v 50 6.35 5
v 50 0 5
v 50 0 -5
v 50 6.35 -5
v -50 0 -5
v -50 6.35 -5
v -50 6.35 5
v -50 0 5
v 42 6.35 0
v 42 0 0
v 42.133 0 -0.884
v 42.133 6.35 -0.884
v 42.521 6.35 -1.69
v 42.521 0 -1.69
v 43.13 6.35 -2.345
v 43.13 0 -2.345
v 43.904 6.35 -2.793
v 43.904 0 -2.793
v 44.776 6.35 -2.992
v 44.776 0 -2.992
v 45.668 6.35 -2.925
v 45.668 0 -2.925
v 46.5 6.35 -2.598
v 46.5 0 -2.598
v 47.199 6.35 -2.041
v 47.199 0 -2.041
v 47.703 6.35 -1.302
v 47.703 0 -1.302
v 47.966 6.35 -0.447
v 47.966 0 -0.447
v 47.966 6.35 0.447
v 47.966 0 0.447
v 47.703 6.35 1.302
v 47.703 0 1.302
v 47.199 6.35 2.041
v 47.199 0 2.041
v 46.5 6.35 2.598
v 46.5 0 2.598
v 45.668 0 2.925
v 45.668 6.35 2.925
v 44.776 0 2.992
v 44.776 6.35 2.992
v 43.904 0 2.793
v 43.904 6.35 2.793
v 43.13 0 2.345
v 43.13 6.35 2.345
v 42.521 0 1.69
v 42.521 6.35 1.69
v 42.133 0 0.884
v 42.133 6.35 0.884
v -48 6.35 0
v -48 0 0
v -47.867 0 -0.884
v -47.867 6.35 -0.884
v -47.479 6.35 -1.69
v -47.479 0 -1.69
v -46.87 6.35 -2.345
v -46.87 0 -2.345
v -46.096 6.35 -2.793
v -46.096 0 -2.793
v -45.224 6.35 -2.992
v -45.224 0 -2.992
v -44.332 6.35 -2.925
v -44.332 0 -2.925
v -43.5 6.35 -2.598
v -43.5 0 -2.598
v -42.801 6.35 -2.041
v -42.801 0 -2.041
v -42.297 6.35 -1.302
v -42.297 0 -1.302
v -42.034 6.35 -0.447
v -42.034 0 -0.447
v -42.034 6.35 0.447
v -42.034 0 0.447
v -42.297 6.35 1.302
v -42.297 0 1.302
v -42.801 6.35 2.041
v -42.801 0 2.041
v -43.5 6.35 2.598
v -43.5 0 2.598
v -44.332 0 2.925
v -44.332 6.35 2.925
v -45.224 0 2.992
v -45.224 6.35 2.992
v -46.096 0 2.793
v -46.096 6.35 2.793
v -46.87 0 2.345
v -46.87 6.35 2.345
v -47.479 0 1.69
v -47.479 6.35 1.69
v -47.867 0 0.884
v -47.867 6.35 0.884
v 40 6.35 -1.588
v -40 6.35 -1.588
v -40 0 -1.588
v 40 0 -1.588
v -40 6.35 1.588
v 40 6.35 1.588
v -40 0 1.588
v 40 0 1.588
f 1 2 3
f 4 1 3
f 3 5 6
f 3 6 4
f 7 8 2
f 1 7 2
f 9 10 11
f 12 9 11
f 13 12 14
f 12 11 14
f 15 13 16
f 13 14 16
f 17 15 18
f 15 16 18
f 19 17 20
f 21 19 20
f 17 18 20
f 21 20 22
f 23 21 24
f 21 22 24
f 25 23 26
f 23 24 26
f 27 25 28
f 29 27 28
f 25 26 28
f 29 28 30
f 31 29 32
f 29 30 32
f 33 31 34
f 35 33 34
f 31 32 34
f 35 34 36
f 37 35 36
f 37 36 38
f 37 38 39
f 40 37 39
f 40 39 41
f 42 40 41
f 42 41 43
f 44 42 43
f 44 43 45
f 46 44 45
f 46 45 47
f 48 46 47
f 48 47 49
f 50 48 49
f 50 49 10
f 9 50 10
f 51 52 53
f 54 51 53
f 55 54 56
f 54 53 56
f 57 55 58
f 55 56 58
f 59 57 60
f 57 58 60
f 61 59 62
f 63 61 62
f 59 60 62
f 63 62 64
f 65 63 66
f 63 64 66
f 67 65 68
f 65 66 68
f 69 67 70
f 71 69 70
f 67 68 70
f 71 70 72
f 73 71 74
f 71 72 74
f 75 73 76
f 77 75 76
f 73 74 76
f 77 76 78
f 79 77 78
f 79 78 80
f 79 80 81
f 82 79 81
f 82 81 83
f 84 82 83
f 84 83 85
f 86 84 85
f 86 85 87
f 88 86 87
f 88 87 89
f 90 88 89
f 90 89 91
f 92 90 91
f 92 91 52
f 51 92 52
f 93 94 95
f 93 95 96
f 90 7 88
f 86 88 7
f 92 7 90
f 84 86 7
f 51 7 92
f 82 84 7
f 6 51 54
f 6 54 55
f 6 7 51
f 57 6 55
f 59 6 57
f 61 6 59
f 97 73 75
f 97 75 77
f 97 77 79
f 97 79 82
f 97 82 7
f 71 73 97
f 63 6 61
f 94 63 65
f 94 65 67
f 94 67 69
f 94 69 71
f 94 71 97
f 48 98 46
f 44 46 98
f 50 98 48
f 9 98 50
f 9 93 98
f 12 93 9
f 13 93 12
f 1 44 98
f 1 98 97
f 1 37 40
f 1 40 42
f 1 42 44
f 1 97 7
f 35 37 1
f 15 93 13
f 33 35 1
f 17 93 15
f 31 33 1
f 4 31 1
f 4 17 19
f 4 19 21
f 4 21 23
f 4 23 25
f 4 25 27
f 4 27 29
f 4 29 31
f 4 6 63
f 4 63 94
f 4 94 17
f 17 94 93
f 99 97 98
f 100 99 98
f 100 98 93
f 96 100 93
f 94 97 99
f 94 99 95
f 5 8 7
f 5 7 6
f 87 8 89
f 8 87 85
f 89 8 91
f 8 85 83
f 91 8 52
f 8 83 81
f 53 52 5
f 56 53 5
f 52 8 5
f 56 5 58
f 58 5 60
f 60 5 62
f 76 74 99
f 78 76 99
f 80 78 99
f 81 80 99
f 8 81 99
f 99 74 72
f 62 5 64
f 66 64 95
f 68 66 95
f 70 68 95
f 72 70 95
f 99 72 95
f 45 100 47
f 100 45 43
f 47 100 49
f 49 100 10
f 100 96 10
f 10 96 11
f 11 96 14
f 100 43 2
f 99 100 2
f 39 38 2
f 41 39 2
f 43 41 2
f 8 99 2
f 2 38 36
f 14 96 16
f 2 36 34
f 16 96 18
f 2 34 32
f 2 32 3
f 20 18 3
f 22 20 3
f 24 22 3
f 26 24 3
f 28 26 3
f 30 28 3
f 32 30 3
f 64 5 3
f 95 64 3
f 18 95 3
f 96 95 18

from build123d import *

# Parameters (mm, degrees)
SKETCH1_W                 = 100
SKETCH1_H                 = 10
BOSS_EXTRUDE1_DEPTH       = 6.35
SKETCH2_W                 = 80
SKETCH2_H                 = 3.175
CUT_EXTRUDE1_DEPTH        = 6.35
F_6_0MM_DOWEL_HOLE1_D     = 6
F_6_0MM_DOWEL_HOLE1_DEPTH = 20
F_6_0MM_DOWEL_HOLE1_TIP   = 1.802581857


with BuildPart() as part:
    # Sketch1 → Boss-Extrude1 (new body)
    with BuildSketch(Plane(origin=(0, 0, 0), x_dir=(1, 0, 0), z_dir=(0, 1, 0))):
        Rectangle(SKETCH1_W, SKETCH1_H)
    extrude(amount=BOSS_EXTRUDE1_DEPTH)

    # Sketch2 → Cut-Extrude1 (cut)
    with BuildSketch(Plane(origin=(0, 6.35, 0), x_dir=(1, 0, 0), z_dir=(0, 1, 0))):
        Rectangle(SKETCH2_W, SKETCH2_H)
    extrude(amount=-CUT_EXTRUDE1_DEPTH, mode=Mode.SUBTRACT)

    # Ø6.0mm Dowel Hole1
    with Locations(Plane(origin=(0, 6.35, 0), x_dir=(1, 0, 0), z_dir=(0, 1, 0))):
        with Locations((-45, 0), (45, 0)):
            Hole(F_6_0MM_DOWEL_HOLE1_D / 2, depth=F_6_0MM_DOWEL_HOLE1_DEPTH)
            with Locations((0, 0, -(F_6_0MM_DOWEL_HOLE1_DEPTH + F_6_0MM_DOWEL_HOLE1_TIP / 2))):  # 118° drill point
                Cone(0, F_6_0MM_DOWEL_HOLE1_D / 2, F_6_0MM_DOWEL_HOLE1_TIP, mode=Mode.SUBTRACT)


solid = part.part
